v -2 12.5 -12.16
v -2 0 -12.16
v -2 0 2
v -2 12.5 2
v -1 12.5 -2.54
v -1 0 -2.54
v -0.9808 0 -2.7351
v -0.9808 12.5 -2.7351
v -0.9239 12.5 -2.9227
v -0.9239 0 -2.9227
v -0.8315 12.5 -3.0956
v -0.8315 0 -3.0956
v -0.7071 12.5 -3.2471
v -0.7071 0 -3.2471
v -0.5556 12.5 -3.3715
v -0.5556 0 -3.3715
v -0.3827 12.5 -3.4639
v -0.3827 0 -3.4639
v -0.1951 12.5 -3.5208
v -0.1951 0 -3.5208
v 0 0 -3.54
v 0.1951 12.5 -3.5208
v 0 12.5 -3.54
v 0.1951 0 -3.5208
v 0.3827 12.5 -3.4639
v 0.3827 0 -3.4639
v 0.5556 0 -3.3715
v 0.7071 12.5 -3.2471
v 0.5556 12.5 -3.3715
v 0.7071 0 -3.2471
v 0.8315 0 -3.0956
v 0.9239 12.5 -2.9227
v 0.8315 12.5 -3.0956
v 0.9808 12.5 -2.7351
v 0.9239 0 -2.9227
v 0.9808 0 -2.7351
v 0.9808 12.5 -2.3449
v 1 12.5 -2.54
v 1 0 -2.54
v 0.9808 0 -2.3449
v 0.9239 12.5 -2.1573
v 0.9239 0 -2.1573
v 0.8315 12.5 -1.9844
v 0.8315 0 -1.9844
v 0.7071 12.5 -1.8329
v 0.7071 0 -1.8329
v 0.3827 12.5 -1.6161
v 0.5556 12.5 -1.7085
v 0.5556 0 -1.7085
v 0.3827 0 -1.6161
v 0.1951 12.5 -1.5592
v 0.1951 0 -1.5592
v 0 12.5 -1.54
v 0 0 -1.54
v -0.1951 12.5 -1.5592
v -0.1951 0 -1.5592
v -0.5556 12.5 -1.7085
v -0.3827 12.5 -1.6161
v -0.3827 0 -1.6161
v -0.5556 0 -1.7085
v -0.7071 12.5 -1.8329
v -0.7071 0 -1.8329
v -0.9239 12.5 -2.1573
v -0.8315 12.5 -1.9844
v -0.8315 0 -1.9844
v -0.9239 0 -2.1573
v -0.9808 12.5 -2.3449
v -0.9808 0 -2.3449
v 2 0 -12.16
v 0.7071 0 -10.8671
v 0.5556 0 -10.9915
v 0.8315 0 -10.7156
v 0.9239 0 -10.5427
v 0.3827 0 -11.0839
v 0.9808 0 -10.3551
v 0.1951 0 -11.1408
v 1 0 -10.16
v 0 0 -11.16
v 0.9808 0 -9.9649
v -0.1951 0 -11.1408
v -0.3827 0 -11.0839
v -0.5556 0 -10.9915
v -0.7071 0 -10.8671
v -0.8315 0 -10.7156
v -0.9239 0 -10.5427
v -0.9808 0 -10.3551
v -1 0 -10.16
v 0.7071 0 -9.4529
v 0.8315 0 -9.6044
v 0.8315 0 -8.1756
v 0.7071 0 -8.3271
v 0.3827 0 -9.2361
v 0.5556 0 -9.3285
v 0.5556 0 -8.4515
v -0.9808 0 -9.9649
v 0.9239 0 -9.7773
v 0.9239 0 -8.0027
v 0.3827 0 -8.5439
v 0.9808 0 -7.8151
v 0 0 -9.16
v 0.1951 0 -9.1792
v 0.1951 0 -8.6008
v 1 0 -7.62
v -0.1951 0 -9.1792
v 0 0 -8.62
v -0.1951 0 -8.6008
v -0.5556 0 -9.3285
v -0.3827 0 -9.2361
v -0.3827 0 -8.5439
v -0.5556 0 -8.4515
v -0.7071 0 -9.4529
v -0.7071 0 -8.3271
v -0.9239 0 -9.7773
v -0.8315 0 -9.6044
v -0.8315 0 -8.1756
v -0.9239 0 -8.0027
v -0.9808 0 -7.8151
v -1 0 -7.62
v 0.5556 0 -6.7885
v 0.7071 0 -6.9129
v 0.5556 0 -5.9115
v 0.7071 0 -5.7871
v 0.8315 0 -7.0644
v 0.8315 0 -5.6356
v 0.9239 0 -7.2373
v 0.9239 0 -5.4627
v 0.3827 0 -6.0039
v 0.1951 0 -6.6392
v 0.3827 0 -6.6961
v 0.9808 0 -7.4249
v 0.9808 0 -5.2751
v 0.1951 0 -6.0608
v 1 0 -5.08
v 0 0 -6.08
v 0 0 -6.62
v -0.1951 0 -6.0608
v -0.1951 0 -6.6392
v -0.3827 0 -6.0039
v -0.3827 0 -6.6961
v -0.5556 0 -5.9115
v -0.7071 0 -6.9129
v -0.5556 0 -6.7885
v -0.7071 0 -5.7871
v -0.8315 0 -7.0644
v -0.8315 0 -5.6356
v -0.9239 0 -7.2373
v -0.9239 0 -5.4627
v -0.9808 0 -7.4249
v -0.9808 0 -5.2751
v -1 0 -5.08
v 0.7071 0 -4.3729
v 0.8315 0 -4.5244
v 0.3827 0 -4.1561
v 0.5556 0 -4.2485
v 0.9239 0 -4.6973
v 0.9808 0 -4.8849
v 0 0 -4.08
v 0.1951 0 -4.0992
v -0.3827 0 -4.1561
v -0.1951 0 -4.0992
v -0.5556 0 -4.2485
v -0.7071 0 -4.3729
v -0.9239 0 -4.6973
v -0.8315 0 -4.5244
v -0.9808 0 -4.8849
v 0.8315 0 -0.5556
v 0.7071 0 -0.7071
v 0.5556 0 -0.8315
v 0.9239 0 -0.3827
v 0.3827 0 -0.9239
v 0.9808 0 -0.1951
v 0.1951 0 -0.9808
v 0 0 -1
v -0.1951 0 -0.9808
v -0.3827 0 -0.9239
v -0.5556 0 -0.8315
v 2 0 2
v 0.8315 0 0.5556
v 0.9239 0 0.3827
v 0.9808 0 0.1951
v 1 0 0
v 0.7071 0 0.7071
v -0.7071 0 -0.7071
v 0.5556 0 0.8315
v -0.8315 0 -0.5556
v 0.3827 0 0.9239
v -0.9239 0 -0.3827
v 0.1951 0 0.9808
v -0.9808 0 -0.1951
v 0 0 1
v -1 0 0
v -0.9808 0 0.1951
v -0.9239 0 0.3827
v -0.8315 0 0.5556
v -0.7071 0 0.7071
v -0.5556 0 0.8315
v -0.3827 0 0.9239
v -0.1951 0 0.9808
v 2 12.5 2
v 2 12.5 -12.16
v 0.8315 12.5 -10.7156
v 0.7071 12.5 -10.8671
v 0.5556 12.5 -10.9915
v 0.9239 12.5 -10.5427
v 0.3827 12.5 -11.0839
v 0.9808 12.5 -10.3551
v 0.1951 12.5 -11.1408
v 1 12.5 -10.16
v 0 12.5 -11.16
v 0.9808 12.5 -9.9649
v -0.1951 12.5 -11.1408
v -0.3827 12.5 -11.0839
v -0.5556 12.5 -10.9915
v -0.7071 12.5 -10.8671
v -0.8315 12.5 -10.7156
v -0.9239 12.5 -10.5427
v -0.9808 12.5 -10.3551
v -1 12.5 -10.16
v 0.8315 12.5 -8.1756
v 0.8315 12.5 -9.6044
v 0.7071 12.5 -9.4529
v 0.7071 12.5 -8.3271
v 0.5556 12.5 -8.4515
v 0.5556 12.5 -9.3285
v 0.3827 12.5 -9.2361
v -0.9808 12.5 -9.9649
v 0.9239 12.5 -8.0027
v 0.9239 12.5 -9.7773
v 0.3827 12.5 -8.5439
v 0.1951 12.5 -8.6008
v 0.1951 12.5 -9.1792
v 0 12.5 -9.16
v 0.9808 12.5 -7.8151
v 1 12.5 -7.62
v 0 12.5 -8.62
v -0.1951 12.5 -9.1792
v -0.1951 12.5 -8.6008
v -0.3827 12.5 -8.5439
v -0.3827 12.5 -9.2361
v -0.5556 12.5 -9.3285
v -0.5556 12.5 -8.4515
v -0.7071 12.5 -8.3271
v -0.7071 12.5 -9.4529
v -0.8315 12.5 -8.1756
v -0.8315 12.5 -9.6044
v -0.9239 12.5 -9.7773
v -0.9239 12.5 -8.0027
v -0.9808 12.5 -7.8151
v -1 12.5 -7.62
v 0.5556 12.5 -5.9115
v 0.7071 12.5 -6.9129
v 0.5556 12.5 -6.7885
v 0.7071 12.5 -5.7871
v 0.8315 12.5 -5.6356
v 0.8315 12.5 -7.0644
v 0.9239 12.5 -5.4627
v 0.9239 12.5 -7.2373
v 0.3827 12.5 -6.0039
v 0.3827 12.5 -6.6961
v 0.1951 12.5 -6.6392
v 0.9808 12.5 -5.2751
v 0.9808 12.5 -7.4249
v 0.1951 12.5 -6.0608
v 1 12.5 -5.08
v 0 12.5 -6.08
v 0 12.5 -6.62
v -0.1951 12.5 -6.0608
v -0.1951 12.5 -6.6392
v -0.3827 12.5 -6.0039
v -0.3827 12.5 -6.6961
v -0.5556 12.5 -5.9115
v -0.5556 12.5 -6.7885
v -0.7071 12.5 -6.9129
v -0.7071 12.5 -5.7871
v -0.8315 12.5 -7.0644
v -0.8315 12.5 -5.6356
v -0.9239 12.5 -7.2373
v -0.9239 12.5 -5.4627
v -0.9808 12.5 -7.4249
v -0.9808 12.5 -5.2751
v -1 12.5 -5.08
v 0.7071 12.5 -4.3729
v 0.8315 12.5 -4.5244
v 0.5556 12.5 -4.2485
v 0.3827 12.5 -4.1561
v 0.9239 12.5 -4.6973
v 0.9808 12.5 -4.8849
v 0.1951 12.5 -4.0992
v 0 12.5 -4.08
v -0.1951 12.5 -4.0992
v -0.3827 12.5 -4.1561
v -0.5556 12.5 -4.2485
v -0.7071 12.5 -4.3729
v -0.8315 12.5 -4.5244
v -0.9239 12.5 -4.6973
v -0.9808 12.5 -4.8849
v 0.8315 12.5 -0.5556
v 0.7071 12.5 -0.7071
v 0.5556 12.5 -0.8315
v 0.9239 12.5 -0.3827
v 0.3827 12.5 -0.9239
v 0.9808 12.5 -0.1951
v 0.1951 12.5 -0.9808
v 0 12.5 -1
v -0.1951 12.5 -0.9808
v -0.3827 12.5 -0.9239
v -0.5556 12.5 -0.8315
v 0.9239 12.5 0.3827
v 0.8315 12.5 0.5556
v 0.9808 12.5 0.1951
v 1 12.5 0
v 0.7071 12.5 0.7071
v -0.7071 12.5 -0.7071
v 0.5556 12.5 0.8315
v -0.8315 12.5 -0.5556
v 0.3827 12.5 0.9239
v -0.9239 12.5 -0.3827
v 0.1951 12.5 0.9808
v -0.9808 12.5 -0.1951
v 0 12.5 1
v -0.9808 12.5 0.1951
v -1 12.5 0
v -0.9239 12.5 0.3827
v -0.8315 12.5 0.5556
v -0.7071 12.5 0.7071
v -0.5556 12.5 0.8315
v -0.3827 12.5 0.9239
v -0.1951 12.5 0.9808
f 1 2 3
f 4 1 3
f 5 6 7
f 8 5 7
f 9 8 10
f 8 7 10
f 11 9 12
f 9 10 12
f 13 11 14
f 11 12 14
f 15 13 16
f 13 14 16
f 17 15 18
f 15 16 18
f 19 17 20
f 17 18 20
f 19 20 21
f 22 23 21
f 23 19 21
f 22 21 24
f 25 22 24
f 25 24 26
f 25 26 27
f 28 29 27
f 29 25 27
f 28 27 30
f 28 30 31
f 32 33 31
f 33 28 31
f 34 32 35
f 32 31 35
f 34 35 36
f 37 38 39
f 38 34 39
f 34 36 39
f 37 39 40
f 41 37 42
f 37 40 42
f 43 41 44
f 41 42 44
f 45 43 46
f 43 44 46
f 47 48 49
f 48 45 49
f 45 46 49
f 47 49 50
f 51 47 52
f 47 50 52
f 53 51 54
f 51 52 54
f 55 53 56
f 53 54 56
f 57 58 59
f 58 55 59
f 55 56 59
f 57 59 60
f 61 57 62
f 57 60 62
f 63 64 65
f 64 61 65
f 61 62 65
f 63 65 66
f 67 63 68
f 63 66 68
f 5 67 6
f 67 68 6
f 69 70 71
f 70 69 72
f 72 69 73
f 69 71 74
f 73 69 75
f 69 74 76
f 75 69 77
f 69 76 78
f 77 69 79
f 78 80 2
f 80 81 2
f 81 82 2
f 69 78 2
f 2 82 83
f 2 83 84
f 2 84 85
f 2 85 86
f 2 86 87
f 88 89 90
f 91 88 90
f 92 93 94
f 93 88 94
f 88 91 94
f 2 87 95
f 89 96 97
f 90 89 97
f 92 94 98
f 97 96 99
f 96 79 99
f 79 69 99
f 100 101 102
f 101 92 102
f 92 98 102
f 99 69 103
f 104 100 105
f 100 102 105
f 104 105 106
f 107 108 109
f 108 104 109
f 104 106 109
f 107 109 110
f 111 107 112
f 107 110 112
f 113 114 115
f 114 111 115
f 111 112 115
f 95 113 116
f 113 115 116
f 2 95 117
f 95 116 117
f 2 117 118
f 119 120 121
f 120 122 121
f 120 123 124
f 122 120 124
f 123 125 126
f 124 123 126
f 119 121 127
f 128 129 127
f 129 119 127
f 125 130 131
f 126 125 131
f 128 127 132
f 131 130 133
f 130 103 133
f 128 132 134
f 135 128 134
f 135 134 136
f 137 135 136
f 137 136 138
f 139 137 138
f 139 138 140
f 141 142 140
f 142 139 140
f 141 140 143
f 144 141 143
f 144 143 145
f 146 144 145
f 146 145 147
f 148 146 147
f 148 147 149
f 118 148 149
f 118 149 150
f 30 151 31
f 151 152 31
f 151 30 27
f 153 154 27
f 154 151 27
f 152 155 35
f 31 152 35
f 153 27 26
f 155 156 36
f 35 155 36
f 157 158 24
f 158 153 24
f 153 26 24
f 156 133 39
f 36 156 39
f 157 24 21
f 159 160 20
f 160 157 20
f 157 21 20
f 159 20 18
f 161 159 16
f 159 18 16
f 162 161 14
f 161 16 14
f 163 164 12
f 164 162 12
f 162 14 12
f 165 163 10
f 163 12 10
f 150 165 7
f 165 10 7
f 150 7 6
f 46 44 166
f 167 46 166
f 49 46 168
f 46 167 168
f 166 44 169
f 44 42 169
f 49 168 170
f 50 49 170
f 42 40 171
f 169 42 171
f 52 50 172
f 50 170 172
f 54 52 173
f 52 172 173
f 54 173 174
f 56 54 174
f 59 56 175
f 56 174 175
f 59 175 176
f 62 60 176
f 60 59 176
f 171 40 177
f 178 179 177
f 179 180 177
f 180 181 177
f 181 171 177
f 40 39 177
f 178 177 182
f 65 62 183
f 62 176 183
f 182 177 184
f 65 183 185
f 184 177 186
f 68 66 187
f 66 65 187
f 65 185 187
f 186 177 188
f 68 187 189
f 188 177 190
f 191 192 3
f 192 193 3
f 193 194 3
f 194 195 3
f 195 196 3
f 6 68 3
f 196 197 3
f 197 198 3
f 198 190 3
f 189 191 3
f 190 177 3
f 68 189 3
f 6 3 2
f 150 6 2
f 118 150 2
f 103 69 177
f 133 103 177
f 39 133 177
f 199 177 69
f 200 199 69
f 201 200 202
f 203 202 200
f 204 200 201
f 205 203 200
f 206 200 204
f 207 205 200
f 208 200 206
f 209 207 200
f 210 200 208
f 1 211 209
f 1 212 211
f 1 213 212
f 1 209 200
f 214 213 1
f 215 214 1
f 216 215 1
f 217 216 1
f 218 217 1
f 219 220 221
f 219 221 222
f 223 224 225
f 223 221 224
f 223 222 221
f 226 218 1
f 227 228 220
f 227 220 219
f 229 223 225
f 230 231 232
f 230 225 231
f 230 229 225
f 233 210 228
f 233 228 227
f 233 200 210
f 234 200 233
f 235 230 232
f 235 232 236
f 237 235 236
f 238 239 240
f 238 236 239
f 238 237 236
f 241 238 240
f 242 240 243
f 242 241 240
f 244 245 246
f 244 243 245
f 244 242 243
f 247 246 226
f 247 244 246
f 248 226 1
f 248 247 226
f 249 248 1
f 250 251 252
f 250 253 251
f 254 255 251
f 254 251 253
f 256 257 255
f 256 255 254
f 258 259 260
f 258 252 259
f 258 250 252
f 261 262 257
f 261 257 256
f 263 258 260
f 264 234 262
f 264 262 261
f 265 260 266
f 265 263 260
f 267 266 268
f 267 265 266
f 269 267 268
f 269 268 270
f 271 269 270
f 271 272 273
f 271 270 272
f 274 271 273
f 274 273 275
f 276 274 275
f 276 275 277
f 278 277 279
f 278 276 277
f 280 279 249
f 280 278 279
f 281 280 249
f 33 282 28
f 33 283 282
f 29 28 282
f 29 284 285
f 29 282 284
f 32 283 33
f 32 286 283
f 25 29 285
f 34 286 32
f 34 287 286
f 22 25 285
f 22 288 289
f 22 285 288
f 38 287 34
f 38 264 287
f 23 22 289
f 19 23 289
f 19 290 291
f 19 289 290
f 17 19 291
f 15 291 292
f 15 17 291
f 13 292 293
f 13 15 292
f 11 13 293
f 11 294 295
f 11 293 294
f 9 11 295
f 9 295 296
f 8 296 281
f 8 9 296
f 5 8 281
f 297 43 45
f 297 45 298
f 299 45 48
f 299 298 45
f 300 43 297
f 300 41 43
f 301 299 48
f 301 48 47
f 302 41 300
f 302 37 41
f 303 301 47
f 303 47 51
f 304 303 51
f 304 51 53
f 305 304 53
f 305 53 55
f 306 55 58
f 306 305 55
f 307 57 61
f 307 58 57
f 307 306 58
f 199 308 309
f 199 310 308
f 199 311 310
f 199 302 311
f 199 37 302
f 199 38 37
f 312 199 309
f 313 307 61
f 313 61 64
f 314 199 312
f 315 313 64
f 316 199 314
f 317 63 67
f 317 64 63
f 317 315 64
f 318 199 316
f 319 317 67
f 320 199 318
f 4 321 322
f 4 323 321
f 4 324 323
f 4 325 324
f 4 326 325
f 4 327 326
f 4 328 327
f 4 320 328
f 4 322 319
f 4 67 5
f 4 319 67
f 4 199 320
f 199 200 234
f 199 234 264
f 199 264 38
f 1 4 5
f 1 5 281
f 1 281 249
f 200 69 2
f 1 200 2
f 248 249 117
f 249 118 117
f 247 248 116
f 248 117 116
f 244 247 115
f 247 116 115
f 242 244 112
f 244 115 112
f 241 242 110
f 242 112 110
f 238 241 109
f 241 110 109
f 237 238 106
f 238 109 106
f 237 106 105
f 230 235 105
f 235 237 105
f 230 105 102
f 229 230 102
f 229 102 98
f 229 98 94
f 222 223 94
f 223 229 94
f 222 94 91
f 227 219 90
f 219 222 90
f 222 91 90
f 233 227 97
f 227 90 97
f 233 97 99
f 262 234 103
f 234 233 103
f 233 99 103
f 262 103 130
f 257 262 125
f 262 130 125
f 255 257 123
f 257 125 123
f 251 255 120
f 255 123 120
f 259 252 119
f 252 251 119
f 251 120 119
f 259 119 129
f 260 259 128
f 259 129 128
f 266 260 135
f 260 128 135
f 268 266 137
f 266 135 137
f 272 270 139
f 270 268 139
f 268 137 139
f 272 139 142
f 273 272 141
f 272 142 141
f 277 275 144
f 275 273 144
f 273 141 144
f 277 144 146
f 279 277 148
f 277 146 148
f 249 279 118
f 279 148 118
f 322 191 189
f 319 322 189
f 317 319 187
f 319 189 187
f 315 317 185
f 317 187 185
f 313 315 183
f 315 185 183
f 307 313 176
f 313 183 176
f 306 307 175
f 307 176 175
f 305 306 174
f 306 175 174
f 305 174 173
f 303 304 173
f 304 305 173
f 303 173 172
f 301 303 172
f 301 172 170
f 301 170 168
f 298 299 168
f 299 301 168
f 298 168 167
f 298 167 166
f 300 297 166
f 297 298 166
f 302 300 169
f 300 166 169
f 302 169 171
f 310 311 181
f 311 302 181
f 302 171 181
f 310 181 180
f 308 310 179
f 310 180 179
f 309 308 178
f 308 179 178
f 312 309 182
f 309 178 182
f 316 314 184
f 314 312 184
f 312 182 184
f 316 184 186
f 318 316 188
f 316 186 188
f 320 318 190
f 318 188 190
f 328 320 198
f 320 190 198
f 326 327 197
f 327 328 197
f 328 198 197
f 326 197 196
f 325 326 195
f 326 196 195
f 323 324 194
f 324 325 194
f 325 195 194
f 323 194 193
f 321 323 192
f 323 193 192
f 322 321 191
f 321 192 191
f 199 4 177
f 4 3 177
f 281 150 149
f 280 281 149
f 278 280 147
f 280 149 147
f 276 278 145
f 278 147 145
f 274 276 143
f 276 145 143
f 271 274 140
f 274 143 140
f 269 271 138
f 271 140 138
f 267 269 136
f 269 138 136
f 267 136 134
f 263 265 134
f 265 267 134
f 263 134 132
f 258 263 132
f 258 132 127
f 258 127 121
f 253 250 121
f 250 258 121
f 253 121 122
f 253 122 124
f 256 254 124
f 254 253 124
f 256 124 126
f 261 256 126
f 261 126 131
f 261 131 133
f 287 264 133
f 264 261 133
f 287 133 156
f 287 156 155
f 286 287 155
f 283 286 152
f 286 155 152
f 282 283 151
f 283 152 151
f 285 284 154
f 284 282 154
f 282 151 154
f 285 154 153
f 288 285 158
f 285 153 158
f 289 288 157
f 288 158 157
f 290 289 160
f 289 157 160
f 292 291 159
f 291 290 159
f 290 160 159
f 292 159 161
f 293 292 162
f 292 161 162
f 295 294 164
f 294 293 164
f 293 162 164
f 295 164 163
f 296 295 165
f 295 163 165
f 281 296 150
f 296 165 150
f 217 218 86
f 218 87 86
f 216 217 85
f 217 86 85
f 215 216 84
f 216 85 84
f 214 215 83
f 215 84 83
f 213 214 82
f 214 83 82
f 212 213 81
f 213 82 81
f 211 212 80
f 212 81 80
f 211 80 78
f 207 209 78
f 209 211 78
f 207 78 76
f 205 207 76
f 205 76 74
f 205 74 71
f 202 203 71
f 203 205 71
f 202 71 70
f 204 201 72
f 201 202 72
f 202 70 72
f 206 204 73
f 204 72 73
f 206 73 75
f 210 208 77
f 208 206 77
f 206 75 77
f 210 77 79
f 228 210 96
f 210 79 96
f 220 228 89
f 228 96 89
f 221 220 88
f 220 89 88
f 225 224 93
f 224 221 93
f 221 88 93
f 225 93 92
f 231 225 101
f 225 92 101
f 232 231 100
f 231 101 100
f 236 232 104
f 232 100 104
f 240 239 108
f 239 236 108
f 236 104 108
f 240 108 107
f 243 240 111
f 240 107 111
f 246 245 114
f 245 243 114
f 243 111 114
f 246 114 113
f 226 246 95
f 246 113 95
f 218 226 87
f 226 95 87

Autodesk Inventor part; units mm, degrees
ref_plane "YZ Plane" through (0, 0, 0) normal (1, 0, 0) x (0, 1, 0)
ref_plane "XZ Plane" through (0, 0, 0) normal (0, 1, 0) x (-1, 0, 0)
ref_plane "XY Plane" through (0, 0, 0) normal (0, 0, 1) x (1, 0, 0)
sketch "Sketch1" plane through (0, 0, 0) normal (0, 1, 0) x (-1, 0, 0)
  circle A0 centre (0, 0) radius 1
  line L0 (2, 2) -> (-2, 2)
  line L1 (-2, 2) -> (-2, -12.16)
  line L2 (-2, -12.16) -> (2, -12.16)
  line L3 (2, -12.16) -> (2, 2)
  circle A1 centre (0, -2.54) radius 1
  circle A2 centre (0, -5.08) radius 1
  circle A3 centre (0, -7.62) radius 1
  circle A4 centre (0, -10.16) radius 1
  dimension "d0" = 2
  dimension "d3" = 2.54
  dimension "d8" = 1
  dimension "d9" = 1
  dimension "d10" = 1
  dimension "d11" = 1
extrude "Extrusion1" add sketch "Sketch1" along normal blind 12.5
equation "\"d9\" = d8"
equation "\"d10\" = d8"
equation "\"d11\" = d8"
properties part number "Encoder Header Spacer 2"
